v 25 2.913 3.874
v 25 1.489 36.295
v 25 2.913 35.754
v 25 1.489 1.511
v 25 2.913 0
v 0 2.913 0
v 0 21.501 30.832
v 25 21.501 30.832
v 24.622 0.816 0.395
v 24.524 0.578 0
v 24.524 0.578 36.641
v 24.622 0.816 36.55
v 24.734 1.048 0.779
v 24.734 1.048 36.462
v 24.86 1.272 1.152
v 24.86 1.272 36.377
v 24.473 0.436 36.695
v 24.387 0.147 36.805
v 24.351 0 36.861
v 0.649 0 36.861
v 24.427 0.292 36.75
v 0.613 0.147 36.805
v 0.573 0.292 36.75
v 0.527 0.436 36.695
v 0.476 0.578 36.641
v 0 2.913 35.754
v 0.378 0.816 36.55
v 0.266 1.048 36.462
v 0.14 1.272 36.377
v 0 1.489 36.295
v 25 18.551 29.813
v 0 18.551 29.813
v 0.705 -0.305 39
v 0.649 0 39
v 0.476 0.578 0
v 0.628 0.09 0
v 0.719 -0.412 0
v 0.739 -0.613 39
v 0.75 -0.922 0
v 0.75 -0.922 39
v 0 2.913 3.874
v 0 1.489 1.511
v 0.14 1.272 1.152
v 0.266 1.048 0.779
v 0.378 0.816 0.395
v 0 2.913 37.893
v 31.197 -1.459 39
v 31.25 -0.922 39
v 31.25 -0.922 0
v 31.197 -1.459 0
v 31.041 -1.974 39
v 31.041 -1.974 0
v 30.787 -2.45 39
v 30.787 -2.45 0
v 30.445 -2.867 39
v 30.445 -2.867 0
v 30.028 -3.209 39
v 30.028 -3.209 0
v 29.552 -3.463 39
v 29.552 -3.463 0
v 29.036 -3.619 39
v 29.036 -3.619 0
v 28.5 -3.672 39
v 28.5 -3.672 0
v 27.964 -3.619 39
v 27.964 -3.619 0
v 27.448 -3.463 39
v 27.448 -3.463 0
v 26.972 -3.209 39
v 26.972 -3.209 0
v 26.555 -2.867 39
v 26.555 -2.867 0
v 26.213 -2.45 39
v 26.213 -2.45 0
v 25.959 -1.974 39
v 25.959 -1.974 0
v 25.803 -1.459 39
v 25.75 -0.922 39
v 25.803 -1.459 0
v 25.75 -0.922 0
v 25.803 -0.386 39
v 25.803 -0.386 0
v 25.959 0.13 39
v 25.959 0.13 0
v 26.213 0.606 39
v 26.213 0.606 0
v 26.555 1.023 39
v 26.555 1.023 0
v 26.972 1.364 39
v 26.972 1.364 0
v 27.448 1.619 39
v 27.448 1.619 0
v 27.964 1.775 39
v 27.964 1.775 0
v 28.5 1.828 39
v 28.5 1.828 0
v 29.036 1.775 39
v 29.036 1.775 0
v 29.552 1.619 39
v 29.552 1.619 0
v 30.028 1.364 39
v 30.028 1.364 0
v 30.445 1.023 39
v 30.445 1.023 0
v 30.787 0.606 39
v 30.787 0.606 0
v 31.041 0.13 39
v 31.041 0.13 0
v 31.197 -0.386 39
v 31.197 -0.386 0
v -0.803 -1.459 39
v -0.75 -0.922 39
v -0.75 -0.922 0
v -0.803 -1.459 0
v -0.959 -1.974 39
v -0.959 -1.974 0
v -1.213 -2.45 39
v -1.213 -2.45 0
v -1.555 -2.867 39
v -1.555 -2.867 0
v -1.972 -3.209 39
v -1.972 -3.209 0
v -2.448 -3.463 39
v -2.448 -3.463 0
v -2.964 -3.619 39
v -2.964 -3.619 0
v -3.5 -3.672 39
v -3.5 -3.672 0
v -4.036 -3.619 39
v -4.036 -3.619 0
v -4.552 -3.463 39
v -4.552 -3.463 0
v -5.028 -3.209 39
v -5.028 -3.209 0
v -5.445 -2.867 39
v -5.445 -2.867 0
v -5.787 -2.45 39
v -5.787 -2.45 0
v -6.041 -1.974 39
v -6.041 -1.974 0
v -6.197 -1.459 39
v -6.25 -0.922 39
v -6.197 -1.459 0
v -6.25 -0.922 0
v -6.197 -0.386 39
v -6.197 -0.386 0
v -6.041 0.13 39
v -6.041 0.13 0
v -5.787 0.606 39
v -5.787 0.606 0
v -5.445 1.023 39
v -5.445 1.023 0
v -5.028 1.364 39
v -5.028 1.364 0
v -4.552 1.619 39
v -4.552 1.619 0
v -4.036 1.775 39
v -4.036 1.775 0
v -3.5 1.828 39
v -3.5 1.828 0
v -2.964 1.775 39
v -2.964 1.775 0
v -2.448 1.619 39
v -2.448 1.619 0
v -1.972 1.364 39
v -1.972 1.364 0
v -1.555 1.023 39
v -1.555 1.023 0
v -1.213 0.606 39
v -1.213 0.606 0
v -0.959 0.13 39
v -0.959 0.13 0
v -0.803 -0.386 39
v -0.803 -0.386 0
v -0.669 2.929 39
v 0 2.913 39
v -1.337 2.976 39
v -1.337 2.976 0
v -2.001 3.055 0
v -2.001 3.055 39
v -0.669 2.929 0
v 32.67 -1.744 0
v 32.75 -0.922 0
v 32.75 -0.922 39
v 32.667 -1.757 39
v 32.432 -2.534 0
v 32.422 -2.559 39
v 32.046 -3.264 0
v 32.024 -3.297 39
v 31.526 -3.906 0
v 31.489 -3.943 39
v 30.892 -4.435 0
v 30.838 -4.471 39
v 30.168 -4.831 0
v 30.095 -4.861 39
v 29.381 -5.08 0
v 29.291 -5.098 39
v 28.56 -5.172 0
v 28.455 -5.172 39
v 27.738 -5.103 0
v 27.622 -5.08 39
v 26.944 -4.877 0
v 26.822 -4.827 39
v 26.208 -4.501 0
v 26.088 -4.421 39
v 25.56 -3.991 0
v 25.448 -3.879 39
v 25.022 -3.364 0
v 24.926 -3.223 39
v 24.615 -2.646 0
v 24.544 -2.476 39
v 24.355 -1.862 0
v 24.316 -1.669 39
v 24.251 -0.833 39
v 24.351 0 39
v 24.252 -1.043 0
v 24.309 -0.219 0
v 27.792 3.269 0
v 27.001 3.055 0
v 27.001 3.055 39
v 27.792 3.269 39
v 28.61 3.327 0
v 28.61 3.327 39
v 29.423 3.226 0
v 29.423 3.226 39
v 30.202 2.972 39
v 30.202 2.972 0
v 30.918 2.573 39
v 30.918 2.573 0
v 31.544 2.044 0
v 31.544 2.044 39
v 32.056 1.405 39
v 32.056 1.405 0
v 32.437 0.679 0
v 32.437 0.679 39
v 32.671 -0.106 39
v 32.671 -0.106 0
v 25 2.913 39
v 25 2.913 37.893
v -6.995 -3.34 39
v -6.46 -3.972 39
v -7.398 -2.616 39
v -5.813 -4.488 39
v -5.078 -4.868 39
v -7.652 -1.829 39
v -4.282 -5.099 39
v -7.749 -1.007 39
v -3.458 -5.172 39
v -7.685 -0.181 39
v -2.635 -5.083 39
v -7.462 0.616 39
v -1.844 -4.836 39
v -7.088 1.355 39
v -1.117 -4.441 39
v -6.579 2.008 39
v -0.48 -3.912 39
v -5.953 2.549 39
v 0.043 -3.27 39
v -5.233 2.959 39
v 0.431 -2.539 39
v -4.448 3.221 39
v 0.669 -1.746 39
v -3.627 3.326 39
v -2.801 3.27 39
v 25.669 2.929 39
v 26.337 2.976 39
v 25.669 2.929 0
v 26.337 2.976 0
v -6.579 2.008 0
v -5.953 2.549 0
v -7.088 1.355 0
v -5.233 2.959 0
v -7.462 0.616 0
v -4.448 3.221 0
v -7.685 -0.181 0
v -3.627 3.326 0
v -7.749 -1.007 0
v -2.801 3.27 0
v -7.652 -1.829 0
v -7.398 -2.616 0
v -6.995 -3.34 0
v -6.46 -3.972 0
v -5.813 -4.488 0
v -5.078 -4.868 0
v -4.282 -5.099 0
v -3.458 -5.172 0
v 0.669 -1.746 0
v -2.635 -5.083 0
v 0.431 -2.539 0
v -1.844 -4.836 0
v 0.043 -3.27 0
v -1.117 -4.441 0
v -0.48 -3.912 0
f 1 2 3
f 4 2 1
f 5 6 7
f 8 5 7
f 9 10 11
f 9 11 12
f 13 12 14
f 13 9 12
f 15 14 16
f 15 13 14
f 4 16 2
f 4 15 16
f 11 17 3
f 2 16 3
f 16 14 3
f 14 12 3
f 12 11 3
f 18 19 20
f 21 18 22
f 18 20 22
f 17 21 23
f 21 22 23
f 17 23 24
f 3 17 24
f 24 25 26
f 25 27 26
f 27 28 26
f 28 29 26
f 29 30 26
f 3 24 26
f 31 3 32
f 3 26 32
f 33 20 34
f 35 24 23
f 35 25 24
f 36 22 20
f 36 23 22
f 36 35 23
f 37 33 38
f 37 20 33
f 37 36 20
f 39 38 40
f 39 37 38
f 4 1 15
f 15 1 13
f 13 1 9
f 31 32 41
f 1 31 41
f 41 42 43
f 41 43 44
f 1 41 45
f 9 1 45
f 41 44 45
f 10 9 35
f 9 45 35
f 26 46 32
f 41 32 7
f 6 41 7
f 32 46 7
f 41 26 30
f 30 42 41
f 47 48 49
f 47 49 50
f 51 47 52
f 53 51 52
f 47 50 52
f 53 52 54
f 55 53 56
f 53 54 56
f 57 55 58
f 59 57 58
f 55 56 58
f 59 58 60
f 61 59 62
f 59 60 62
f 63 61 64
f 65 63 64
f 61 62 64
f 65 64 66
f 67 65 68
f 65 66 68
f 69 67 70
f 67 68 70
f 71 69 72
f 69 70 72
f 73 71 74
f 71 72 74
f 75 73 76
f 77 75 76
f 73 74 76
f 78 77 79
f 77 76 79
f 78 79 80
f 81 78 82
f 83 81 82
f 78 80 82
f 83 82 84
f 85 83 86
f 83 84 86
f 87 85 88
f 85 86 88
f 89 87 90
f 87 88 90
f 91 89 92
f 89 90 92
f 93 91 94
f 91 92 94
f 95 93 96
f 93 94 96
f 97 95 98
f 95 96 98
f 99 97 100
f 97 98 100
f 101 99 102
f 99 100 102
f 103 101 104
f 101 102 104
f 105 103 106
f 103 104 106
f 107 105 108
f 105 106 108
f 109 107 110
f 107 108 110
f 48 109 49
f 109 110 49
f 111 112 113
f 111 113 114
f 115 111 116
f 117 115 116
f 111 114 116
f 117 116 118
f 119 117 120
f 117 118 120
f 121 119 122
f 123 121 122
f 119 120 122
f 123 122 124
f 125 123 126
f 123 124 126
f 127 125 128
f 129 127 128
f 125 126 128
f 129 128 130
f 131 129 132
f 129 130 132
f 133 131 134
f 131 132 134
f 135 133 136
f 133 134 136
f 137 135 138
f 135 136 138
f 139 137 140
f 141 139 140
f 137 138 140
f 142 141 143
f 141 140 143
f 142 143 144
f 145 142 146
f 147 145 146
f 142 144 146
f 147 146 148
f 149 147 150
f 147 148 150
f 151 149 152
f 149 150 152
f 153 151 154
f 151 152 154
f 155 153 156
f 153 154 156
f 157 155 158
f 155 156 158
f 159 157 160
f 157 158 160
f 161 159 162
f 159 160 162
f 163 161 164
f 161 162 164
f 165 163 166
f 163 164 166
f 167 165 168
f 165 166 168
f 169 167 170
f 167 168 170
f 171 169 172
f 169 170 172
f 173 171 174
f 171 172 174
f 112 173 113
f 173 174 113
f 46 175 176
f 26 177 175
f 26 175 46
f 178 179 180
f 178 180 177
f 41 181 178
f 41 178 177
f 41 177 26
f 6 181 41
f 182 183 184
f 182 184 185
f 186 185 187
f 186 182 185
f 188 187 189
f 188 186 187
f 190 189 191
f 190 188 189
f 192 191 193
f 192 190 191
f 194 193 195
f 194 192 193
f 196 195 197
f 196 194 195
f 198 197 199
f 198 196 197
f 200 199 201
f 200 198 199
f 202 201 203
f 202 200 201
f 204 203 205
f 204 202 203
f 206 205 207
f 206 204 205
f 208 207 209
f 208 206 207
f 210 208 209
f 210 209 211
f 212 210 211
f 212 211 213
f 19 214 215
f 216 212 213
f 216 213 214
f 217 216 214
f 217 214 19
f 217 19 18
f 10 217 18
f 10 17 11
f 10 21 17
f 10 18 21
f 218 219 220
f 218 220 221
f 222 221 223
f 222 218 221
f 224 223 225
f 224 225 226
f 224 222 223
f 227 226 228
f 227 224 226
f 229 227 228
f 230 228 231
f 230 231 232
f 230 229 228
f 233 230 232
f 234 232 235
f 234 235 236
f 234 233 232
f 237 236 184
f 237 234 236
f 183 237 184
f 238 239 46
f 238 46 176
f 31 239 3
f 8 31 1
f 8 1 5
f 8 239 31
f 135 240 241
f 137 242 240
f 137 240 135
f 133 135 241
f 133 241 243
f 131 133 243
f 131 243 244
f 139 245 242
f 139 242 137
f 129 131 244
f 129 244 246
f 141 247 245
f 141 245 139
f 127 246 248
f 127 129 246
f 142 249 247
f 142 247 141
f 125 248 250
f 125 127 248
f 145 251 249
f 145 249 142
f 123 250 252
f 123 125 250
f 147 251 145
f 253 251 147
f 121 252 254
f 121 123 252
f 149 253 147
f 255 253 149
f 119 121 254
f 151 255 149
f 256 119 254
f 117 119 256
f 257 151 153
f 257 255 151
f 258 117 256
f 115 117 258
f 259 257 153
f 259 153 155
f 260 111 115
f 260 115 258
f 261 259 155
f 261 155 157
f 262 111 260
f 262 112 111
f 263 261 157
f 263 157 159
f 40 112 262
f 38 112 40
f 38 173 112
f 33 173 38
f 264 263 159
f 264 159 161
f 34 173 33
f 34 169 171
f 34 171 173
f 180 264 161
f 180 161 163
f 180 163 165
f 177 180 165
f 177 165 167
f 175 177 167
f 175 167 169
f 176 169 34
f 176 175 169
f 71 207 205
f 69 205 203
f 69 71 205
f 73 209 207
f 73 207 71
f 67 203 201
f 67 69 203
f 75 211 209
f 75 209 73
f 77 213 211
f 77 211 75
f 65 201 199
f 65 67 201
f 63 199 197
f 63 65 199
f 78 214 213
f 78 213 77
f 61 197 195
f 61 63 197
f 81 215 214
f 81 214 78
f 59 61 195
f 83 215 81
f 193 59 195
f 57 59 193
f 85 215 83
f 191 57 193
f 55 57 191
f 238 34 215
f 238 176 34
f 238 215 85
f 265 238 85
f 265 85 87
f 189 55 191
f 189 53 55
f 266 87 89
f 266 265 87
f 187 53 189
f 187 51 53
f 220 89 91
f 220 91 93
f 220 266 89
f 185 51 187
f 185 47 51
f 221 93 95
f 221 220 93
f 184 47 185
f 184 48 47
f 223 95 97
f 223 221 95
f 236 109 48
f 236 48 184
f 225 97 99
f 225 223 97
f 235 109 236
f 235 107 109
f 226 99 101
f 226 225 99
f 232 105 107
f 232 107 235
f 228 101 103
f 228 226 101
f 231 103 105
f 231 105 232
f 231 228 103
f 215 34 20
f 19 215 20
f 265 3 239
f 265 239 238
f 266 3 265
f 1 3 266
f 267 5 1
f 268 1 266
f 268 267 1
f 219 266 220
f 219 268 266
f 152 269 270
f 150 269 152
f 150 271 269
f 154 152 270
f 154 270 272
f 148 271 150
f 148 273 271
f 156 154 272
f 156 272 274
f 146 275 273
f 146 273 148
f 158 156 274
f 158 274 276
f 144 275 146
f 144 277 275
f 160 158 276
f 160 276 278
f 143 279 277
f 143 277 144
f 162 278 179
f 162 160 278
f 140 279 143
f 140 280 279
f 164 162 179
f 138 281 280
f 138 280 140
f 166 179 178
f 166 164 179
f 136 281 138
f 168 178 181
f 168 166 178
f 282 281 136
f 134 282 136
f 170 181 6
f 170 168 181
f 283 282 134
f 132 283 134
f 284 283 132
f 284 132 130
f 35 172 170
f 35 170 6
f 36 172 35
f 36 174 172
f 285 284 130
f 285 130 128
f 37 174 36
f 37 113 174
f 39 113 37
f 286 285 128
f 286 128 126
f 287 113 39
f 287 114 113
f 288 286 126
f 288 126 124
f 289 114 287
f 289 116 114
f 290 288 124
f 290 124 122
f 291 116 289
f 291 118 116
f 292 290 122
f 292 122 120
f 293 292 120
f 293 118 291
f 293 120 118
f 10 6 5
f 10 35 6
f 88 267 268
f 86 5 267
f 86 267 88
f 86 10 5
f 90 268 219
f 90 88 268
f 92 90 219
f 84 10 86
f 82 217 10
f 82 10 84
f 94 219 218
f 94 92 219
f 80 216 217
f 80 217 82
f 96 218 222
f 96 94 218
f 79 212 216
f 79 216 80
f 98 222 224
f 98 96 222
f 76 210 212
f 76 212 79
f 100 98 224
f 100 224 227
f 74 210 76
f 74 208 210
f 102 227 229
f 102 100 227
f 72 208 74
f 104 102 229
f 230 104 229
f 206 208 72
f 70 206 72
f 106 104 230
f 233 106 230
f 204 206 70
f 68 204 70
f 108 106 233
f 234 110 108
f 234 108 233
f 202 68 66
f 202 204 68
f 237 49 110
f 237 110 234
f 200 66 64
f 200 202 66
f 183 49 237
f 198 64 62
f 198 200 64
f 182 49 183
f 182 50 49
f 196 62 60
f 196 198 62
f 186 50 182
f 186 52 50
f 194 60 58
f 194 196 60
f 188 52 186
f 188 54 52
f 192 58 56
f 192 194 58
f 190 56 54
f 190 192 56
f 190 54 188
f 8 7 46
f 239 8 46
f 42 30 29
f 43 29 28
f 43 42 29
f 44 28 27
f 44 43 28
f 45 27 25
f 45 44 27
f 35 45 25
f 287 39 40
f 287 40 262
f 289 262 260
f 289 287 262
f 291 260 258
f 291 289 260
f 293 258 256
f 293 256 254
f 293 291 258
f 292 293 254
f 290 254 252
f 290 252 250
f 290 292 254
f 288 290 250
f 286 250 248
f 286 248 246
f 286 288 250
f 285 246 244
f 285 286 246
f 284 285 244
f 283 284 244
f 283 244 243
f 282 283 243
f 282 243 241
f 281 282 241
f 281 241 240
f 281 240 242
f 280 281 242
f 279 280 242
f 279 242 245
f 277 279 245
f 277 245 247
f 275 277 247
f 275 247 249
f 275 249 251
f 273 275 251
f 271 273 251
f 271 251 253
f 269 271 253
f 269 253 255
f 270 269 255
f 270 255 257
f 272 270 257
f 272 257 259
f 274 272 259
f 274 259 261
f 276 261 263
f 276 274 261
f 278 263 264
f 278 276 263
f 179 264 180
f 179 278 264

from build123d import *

# Parameters (mm, degrees)
F1_DEPTH = 25
F2_R     = 2.75
F3_DEPTH = 39
F6_DEPTH = 39
F7_DEPTH = 25
F8_DEPTH = 1.4888694367


with BuildPart() as f1:
    # F0 (on Right) → F1 (new body)
    with BuildSketch(Plane.YZ):
        Polygon((18.5510310847, 29.8126723238), (0.5779567464, 0), (2.9132927302, 0), (21.5006141558, 30.8315490499), (0, 39), (0, 36.8605262312), align=None)
    extrude(amount=F1_DEPTH)

    # F2 (on face) → F3 (join)
    with BuildSketch(Plane(origin=(0, 0, 0), x_dir=(1, 0, 0), z_dir=(0, 0, -1))):
        with BuildLine():
            ThreePointArc((0.4764934301, -0.5779567464), (0.6810642831, 0.1596775533), (0.75, 0.9220432536))
            ThreePointArc((0.75, 0.9220432536), (-7.5581707702, 2.1844813709), (0, -1.4888694367))
            Line((0, -1.4888694367), (0, -0.5779567464))
            Line((0, -0.5779567464), (0.4764934301, -0.5779567464))
        make_face()
        with Locations((-3.5, 0.9220432536)):
            Circle(F2_R, mode=Mode.SUBTRACT)
        with BuildLine():
            Line((0, -0.5779567464), (0, -1.4888694367))
            ThreePointArc((0, -1.4888694367), (0.2658901982, -1.0478732459), (0.4764934301, -0.5779567464))
            Line((0.4764934301, -0.5779567464), (0, -0.5779567464))
        make_face()
        with BuildLine():
            ThreePointArc((32.75, 0.9220432536), (27.7376342997, 5.1031075366), (24.5235065699, -0.5779567464))
            Line((24.5235065699, -0.5779567464), (25, -0.5779567464))
            Line((25, -0.5779567464), (25, -1.4888694367))
            ThreePointArc((25, -1.4888694367), (29.7624381173, -3.1361275166), (32.75, 0.9220432536))
        make_face()
        with Locations((28.5, 0.9220432536)):
            Circle(F2_R, mode=Mode.SUBTRACT)
        with BuildLine():
            Line((25, -0.5779567464), (24.5235065699, -0.5779567464))
            ThreePointArc((24.5235065699, -0.5779567464), (24.7341098018, -1.0478732459), (25, -1.4888694367))
            Line((25, -1.4888694367), (25, -0.5779567464))
        make_face()
    extrude(amount=-F3_DEPTH)

    # F5 (on face) → F6 (join, through all)
    with BuildSketch(Plane(origin=(0, 0, 0), x_dir=(1, 0, 0), z_dir=(0, 0, -1))):
        with BuildLine():
            ThreePointArc((-2.0012357145, -3.0549160895), (-1.0031203269, -2.9487427884), (0, -2.9132927302))
            Line((0, -2.9132927302), (0, -1.4888694367))
            ThreePointArc((0, -1.4888694367), (-0.8808328375, -2.4249648693), (-2.0012357145, -3.0549160895))
        make_face()
        with BuildLine():
            Line((25, -1.4888694367), (25, -2.9132927302))
            ThreePointArc((25, -2.9132927302), (26.0031203269, -2.9487427884), (27.0012357145, -3.0549160895))
            ThreePointArc((27.0012357145, -3.0549160895), (25.8808328375, -2.4249648693), (25, -1.4888694367))
        make_face()
    extrude(amount=-F6_DEPTH)

    # F7 (add): a face of the model
    f7_faces = [f1.faces().sort_by_distance(p)[0] for p in [
        (0, 2.2778987033, 38.5672936668),
    ]]
    extrude(f7_faces, amount=F7_DEPTH)

    # F8 (add, through all): a face of the model
    f8_faces = [f1.faces().sort_by_distance(p)[0] for p in [
        (12.5, 1.4888694367, 38.7171765216),
    ]]
    extrude(f8_faces, amount=F8_DEPTH)


solid = f1.part
